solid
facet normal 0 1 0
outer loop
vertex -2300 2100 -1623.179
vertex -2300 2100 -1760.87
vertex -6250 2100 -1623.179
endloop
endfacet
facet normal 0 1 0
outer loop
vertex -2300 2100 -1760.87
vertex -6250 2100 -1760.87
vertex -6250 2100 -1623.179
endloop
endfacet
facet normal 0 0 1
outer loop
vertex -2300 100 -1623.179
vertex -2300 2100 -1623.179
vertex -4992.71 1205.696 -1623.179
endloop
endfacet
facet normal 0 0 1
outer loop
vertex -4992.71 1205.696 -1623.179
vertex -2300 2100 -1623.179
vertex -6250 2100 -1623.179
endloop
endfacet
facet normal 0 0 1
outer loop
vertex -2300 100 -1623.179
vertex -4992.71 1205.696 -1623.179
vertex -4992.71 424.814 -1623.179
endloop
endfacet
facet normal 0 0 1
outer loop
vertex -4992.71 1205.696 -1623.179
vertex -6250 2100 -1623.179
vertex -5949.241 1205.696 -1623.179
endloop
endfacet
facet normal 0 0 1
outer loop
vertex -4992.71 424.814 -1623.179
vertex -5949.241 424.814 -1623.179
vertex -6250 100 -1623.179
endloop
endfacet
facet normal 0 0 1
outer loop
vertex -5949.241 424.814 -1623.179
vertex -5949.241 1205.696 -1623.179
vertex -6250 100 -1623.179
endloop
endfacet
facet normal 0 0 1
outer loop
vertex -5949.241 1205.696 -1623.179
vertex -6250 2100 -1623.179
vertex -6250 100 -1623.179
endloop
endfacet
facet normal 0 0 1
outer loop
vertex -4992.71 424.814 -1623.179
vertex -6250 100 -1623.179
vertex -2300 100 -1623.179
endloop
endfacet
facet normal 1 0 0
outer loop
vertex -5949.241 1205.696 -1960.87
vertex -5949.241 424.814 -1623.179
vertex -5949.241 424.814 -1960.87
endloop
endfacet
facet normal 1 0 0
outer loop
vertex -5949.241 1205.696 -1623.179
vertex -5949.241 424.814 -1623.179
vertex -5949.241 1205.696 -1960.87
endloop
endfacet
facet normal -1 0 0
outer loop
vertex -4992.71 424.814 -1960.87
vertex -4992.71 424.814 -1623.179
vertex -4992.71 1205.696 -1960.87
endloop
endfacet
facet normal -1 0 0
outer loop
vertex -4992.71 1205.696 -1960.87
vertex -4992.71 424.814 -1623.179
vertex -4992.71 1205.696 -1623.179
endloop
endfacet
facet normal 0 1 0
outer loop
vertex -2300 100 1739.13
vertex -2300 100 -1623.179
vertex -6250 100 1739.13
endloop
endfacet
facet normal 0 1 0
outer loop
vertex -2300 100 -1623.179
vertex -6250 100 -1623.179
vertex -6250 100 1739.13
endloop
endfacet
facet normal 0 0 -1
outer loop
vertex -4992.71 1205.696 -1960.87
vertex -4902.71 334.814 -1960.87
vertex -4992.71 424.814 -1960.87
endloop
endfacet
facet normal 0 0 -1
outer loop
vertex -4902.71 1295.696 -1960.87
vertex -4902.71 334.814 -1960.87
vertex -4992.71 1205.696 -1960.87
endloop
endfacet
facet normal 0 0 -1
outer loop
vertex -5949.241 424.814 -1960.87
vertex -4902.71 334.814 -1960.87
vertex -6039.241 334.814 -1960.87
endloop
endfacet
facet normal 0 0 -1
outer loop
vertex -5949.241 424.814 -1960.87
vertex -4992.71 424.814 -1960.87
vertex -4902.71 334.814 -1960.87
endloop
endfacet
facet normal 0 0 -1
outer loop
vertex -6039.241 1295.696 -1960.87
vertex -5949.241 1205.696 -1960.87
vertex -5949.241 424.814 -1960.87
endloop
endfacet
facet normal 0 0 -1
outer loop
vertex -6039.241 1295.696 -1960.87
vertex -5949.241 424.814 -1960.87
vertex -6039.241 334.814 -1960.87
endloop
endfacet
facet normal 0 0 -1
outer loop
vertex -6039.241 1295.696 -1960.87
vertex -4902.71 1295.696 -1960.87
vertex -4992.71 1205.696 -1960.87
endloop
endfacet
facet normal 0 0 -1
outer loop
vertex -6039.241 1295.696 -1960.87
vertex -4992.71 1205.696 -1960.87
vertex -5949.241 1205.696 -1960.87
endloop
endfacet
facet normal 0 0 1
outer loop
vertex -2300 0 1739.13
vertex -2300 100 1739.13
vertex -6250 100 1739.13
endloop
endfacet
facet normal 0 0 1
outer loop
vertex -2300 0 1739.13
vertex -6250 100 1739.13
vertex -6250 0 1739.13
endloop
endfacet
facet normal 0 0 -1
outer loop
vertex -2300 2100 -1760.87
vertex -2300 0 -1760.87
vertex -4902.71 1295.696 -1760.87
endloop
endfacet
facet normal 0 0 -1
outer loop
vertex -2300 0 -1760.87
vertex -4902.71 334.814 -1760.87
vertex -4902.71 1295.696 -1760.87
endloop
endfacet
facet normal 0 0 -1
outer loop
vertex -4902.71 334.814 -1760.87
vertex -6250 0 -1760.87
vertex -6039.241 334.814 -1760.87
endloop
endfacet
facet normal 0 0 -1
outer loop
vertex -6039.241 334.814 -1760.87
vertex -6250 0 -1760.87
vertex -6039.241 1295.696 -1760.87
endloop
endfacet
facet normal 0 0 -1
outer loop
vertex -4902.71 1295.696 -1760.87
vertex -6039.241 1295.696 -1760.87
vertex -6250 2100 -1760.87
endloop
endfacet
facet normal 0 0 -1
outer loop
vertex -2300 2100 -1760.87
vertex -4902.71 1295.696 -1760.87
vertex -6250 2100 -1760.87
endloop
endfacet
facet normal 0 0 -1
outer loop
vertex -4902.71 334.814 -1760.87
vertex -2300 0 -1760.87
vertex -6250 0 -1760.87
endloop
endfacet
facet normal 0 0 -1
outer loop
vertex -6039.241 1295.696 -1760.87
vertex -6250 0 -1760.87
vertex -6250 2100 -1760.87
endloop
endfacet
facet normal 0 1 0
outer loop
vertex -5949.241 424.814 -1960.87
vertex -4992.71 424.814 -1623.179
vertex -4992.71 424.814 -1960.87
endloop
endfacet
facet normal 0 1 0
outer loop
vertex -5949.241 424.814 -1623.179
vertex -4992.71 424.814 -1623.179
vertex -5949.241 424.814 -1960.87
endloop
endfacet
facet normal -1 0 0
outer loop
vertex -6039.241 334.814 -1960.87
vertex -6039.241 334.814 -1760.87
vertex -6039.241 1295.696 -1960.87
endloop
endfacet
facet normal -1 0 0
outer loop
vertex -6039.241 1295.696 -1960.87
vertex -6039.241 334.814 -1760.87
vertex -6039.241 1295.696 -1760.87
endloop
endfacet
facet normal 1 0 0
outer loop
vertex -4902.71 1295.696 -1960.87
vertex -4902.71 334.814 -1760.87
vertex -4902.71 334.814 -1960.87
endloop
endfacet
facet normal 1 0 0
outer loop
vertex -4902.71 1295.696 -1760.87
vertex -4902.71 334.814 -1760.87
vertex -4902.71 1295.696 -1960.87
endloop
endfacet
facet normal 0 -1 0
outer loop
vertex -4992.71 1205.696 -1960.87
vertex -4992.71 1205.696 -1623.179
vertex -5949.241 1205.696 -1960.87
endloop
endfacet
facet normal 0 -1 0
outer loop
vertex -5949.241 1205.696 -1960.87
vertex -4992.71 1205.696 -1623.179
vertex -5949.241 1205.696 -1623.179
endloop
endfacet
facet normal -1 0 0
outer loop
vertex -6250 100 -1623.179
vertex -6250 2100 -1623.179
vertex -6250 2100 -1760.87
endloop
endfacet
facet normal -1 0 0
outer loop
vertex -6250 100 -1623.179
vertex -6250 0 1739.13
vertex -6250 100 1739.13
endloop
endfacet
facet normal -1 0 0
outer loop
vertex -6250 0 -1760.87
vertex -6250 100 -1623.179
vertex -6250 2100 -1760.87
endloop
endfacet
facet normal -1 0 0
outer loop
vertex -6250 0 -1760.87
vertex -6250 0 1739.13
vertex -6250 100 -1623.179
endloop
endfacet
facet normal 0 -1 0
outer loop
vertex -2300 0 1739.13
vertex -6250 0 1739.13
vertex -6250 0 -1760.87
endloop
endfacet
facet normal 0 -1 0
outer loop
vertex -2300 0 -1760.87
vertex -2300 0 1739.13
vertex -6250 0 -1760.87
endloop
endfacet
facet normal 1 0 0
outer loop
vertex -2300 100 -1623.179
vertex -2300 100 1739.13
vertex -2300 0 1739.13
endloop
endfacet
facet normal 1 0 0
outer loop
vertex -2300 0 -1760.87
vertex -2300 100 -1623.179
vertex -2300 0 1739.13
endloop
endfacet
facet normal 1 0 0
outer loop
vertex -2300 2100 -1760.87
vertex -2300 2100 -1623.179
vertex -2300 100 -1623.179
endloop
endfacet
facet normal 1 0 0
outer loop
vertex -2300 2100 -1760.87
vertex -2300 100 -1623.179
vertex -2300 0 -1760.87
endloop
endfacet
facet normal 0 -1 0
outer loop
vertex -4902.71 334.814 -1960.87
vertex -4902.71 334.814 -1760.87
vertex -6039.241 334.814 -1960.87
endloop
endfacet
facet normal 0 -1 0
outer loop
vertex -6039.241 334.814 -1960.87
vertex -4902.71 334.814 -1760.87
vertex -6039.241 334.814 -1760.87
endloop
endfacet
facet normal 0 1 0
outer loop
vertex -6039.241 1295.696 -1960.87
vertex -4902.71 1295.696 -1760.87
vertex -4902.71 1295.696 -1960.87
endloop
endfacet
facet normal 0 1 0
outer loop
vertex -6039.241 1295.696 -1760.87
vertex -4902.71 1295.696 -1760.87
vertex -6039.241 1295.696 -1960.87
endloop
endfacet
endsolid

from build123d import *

# Parameters (mm, degrees)
SKETCH1_W               = 3000
SKETCH1_H               = 3500
BOSS_EXTRUDE1_DEPTH     = 100
SKETCH2_W               = 3000
SKETCH2_H               = 912.690829392
BOSS_EXTRUDE2_DEPTH     = 2000
SKETCH3_W               = 1136.531775123
SKETCH3_H               = 960.882098035
SKETCH3_W_2             = 956.531775123
SKETCH3_H_2             = 780.882098035
BOSS_EXTRUDE3_DEPTH     = 200
SKETCH4_W               = 3000
SKETCH4_H               = 2000
CUT_EXTRUDE1_DEPTH      = 775
CUT_EXTRUDE2_DEPTH      = 7465.750498175
CUT_EXTRUDE2_DEPTH_BACK = 7465.750498175
SKETCH5_W               = 956.531775123
SKETCH5_H               = 780.882098035
BOSS_EXTRUDE4_DEPTH     = 950


with BuildPart() as part:
    # Sketch1 → Boss-Extrude1 (new body)
    with BuildSketch(Plane(origin=(0, 0, 0), x_dir=(1, 0, 0), z_dir=(0, 1, 0))):
        with Locations((-4750, 10.869565217)):
            Rectangle(SKETCH1_W, SKETCH1_H)
    extrude(amount=BOSS_EXTRUDE1_DEPTH)

    # Sketch2 → Boss-Extrude2 (add)
    with BuildSketch(Plane(origin=(0, 100, 0), x_dir=(1, 0, 0), z_dir=(0, 1, 0))):
        with Locations((-4750, 1304.524150521)):
            Rectangle(SKETCH2_W, SKETCH2_H)
    extrude(amount=BOSS_EXTRUDE2_DEPTH)

    # Sketch3 → Boss-Extrude3 (add)
    with BuildSketch(Plane(origin=(0, 0, -1760.869565217), x_dir=(-1, 0, 0), z_dir=(0, 0, -1))):
        with Locations((5470.975470672, 815.25473368)):
            Rectangle(SKETCH3_W, SKETCH3_H)
        with Locations((5470.975470672, 815.25473368)):
            Rectangle(SKETCH3_W_2, SKETCH3_H_2, mode=Mode.SUBTRACT)
    extrude(amount=BOSS_EXTRUDE3_DEPTH)

    # Sketch4 → Cut-Extrude1 (cut)
    with BuildSketch(Plane.XY.offset(-848.178735825)):
        with Locations((-4750, 1100)):
            Rectangle(SKETCH4_W, SKETCH4_H)
    extrude(amount=-CUT_EXTRUDE1_DEPTH, mode=Mode.SUBTRACT)

    # Sketch5 → Cut-Extrude2 (cut, two sides: drawn at the far end of the back side and taken through both)
    with BuildSketch(Plane(origin=(0, 0, -1760.869565217), x_dir=(-1, 0, 0), z_dir=(0, 0, -1)).offset(-CUT_EXTRUDE2_DEPTH_BACK)):
        with Locations((5470.975470672, 815.25473368)):
            Rectangle(SKETCH5_W, SKETCH5_H)
    extrude(amount=CUT_EXTRUDE2_DEPTH + CUT_EXTRUDE2_DEPTH_BACK, mode=Mode.SUBTRACT)

    # Sketch6 → Boss-Extrude4 (add)
    with BuildSketch(Plane(origin=(-3250, 0, 0), x_dir=(0, 0, -1), z_dir=(1, 0, 0))):
        Polygon((1760.869565217, 0), (1760.869565217, 2100), (1623.178735825, 2100), (1623.178735825, 100), (-1739.130434783, 100), (-1739.130434783, 0), (1620.900155495, 0), (1623.178735825, 0), align=None)
    extrude(amount=BOSS_EXTRUDE4_DEPTH)


solid = part.part
